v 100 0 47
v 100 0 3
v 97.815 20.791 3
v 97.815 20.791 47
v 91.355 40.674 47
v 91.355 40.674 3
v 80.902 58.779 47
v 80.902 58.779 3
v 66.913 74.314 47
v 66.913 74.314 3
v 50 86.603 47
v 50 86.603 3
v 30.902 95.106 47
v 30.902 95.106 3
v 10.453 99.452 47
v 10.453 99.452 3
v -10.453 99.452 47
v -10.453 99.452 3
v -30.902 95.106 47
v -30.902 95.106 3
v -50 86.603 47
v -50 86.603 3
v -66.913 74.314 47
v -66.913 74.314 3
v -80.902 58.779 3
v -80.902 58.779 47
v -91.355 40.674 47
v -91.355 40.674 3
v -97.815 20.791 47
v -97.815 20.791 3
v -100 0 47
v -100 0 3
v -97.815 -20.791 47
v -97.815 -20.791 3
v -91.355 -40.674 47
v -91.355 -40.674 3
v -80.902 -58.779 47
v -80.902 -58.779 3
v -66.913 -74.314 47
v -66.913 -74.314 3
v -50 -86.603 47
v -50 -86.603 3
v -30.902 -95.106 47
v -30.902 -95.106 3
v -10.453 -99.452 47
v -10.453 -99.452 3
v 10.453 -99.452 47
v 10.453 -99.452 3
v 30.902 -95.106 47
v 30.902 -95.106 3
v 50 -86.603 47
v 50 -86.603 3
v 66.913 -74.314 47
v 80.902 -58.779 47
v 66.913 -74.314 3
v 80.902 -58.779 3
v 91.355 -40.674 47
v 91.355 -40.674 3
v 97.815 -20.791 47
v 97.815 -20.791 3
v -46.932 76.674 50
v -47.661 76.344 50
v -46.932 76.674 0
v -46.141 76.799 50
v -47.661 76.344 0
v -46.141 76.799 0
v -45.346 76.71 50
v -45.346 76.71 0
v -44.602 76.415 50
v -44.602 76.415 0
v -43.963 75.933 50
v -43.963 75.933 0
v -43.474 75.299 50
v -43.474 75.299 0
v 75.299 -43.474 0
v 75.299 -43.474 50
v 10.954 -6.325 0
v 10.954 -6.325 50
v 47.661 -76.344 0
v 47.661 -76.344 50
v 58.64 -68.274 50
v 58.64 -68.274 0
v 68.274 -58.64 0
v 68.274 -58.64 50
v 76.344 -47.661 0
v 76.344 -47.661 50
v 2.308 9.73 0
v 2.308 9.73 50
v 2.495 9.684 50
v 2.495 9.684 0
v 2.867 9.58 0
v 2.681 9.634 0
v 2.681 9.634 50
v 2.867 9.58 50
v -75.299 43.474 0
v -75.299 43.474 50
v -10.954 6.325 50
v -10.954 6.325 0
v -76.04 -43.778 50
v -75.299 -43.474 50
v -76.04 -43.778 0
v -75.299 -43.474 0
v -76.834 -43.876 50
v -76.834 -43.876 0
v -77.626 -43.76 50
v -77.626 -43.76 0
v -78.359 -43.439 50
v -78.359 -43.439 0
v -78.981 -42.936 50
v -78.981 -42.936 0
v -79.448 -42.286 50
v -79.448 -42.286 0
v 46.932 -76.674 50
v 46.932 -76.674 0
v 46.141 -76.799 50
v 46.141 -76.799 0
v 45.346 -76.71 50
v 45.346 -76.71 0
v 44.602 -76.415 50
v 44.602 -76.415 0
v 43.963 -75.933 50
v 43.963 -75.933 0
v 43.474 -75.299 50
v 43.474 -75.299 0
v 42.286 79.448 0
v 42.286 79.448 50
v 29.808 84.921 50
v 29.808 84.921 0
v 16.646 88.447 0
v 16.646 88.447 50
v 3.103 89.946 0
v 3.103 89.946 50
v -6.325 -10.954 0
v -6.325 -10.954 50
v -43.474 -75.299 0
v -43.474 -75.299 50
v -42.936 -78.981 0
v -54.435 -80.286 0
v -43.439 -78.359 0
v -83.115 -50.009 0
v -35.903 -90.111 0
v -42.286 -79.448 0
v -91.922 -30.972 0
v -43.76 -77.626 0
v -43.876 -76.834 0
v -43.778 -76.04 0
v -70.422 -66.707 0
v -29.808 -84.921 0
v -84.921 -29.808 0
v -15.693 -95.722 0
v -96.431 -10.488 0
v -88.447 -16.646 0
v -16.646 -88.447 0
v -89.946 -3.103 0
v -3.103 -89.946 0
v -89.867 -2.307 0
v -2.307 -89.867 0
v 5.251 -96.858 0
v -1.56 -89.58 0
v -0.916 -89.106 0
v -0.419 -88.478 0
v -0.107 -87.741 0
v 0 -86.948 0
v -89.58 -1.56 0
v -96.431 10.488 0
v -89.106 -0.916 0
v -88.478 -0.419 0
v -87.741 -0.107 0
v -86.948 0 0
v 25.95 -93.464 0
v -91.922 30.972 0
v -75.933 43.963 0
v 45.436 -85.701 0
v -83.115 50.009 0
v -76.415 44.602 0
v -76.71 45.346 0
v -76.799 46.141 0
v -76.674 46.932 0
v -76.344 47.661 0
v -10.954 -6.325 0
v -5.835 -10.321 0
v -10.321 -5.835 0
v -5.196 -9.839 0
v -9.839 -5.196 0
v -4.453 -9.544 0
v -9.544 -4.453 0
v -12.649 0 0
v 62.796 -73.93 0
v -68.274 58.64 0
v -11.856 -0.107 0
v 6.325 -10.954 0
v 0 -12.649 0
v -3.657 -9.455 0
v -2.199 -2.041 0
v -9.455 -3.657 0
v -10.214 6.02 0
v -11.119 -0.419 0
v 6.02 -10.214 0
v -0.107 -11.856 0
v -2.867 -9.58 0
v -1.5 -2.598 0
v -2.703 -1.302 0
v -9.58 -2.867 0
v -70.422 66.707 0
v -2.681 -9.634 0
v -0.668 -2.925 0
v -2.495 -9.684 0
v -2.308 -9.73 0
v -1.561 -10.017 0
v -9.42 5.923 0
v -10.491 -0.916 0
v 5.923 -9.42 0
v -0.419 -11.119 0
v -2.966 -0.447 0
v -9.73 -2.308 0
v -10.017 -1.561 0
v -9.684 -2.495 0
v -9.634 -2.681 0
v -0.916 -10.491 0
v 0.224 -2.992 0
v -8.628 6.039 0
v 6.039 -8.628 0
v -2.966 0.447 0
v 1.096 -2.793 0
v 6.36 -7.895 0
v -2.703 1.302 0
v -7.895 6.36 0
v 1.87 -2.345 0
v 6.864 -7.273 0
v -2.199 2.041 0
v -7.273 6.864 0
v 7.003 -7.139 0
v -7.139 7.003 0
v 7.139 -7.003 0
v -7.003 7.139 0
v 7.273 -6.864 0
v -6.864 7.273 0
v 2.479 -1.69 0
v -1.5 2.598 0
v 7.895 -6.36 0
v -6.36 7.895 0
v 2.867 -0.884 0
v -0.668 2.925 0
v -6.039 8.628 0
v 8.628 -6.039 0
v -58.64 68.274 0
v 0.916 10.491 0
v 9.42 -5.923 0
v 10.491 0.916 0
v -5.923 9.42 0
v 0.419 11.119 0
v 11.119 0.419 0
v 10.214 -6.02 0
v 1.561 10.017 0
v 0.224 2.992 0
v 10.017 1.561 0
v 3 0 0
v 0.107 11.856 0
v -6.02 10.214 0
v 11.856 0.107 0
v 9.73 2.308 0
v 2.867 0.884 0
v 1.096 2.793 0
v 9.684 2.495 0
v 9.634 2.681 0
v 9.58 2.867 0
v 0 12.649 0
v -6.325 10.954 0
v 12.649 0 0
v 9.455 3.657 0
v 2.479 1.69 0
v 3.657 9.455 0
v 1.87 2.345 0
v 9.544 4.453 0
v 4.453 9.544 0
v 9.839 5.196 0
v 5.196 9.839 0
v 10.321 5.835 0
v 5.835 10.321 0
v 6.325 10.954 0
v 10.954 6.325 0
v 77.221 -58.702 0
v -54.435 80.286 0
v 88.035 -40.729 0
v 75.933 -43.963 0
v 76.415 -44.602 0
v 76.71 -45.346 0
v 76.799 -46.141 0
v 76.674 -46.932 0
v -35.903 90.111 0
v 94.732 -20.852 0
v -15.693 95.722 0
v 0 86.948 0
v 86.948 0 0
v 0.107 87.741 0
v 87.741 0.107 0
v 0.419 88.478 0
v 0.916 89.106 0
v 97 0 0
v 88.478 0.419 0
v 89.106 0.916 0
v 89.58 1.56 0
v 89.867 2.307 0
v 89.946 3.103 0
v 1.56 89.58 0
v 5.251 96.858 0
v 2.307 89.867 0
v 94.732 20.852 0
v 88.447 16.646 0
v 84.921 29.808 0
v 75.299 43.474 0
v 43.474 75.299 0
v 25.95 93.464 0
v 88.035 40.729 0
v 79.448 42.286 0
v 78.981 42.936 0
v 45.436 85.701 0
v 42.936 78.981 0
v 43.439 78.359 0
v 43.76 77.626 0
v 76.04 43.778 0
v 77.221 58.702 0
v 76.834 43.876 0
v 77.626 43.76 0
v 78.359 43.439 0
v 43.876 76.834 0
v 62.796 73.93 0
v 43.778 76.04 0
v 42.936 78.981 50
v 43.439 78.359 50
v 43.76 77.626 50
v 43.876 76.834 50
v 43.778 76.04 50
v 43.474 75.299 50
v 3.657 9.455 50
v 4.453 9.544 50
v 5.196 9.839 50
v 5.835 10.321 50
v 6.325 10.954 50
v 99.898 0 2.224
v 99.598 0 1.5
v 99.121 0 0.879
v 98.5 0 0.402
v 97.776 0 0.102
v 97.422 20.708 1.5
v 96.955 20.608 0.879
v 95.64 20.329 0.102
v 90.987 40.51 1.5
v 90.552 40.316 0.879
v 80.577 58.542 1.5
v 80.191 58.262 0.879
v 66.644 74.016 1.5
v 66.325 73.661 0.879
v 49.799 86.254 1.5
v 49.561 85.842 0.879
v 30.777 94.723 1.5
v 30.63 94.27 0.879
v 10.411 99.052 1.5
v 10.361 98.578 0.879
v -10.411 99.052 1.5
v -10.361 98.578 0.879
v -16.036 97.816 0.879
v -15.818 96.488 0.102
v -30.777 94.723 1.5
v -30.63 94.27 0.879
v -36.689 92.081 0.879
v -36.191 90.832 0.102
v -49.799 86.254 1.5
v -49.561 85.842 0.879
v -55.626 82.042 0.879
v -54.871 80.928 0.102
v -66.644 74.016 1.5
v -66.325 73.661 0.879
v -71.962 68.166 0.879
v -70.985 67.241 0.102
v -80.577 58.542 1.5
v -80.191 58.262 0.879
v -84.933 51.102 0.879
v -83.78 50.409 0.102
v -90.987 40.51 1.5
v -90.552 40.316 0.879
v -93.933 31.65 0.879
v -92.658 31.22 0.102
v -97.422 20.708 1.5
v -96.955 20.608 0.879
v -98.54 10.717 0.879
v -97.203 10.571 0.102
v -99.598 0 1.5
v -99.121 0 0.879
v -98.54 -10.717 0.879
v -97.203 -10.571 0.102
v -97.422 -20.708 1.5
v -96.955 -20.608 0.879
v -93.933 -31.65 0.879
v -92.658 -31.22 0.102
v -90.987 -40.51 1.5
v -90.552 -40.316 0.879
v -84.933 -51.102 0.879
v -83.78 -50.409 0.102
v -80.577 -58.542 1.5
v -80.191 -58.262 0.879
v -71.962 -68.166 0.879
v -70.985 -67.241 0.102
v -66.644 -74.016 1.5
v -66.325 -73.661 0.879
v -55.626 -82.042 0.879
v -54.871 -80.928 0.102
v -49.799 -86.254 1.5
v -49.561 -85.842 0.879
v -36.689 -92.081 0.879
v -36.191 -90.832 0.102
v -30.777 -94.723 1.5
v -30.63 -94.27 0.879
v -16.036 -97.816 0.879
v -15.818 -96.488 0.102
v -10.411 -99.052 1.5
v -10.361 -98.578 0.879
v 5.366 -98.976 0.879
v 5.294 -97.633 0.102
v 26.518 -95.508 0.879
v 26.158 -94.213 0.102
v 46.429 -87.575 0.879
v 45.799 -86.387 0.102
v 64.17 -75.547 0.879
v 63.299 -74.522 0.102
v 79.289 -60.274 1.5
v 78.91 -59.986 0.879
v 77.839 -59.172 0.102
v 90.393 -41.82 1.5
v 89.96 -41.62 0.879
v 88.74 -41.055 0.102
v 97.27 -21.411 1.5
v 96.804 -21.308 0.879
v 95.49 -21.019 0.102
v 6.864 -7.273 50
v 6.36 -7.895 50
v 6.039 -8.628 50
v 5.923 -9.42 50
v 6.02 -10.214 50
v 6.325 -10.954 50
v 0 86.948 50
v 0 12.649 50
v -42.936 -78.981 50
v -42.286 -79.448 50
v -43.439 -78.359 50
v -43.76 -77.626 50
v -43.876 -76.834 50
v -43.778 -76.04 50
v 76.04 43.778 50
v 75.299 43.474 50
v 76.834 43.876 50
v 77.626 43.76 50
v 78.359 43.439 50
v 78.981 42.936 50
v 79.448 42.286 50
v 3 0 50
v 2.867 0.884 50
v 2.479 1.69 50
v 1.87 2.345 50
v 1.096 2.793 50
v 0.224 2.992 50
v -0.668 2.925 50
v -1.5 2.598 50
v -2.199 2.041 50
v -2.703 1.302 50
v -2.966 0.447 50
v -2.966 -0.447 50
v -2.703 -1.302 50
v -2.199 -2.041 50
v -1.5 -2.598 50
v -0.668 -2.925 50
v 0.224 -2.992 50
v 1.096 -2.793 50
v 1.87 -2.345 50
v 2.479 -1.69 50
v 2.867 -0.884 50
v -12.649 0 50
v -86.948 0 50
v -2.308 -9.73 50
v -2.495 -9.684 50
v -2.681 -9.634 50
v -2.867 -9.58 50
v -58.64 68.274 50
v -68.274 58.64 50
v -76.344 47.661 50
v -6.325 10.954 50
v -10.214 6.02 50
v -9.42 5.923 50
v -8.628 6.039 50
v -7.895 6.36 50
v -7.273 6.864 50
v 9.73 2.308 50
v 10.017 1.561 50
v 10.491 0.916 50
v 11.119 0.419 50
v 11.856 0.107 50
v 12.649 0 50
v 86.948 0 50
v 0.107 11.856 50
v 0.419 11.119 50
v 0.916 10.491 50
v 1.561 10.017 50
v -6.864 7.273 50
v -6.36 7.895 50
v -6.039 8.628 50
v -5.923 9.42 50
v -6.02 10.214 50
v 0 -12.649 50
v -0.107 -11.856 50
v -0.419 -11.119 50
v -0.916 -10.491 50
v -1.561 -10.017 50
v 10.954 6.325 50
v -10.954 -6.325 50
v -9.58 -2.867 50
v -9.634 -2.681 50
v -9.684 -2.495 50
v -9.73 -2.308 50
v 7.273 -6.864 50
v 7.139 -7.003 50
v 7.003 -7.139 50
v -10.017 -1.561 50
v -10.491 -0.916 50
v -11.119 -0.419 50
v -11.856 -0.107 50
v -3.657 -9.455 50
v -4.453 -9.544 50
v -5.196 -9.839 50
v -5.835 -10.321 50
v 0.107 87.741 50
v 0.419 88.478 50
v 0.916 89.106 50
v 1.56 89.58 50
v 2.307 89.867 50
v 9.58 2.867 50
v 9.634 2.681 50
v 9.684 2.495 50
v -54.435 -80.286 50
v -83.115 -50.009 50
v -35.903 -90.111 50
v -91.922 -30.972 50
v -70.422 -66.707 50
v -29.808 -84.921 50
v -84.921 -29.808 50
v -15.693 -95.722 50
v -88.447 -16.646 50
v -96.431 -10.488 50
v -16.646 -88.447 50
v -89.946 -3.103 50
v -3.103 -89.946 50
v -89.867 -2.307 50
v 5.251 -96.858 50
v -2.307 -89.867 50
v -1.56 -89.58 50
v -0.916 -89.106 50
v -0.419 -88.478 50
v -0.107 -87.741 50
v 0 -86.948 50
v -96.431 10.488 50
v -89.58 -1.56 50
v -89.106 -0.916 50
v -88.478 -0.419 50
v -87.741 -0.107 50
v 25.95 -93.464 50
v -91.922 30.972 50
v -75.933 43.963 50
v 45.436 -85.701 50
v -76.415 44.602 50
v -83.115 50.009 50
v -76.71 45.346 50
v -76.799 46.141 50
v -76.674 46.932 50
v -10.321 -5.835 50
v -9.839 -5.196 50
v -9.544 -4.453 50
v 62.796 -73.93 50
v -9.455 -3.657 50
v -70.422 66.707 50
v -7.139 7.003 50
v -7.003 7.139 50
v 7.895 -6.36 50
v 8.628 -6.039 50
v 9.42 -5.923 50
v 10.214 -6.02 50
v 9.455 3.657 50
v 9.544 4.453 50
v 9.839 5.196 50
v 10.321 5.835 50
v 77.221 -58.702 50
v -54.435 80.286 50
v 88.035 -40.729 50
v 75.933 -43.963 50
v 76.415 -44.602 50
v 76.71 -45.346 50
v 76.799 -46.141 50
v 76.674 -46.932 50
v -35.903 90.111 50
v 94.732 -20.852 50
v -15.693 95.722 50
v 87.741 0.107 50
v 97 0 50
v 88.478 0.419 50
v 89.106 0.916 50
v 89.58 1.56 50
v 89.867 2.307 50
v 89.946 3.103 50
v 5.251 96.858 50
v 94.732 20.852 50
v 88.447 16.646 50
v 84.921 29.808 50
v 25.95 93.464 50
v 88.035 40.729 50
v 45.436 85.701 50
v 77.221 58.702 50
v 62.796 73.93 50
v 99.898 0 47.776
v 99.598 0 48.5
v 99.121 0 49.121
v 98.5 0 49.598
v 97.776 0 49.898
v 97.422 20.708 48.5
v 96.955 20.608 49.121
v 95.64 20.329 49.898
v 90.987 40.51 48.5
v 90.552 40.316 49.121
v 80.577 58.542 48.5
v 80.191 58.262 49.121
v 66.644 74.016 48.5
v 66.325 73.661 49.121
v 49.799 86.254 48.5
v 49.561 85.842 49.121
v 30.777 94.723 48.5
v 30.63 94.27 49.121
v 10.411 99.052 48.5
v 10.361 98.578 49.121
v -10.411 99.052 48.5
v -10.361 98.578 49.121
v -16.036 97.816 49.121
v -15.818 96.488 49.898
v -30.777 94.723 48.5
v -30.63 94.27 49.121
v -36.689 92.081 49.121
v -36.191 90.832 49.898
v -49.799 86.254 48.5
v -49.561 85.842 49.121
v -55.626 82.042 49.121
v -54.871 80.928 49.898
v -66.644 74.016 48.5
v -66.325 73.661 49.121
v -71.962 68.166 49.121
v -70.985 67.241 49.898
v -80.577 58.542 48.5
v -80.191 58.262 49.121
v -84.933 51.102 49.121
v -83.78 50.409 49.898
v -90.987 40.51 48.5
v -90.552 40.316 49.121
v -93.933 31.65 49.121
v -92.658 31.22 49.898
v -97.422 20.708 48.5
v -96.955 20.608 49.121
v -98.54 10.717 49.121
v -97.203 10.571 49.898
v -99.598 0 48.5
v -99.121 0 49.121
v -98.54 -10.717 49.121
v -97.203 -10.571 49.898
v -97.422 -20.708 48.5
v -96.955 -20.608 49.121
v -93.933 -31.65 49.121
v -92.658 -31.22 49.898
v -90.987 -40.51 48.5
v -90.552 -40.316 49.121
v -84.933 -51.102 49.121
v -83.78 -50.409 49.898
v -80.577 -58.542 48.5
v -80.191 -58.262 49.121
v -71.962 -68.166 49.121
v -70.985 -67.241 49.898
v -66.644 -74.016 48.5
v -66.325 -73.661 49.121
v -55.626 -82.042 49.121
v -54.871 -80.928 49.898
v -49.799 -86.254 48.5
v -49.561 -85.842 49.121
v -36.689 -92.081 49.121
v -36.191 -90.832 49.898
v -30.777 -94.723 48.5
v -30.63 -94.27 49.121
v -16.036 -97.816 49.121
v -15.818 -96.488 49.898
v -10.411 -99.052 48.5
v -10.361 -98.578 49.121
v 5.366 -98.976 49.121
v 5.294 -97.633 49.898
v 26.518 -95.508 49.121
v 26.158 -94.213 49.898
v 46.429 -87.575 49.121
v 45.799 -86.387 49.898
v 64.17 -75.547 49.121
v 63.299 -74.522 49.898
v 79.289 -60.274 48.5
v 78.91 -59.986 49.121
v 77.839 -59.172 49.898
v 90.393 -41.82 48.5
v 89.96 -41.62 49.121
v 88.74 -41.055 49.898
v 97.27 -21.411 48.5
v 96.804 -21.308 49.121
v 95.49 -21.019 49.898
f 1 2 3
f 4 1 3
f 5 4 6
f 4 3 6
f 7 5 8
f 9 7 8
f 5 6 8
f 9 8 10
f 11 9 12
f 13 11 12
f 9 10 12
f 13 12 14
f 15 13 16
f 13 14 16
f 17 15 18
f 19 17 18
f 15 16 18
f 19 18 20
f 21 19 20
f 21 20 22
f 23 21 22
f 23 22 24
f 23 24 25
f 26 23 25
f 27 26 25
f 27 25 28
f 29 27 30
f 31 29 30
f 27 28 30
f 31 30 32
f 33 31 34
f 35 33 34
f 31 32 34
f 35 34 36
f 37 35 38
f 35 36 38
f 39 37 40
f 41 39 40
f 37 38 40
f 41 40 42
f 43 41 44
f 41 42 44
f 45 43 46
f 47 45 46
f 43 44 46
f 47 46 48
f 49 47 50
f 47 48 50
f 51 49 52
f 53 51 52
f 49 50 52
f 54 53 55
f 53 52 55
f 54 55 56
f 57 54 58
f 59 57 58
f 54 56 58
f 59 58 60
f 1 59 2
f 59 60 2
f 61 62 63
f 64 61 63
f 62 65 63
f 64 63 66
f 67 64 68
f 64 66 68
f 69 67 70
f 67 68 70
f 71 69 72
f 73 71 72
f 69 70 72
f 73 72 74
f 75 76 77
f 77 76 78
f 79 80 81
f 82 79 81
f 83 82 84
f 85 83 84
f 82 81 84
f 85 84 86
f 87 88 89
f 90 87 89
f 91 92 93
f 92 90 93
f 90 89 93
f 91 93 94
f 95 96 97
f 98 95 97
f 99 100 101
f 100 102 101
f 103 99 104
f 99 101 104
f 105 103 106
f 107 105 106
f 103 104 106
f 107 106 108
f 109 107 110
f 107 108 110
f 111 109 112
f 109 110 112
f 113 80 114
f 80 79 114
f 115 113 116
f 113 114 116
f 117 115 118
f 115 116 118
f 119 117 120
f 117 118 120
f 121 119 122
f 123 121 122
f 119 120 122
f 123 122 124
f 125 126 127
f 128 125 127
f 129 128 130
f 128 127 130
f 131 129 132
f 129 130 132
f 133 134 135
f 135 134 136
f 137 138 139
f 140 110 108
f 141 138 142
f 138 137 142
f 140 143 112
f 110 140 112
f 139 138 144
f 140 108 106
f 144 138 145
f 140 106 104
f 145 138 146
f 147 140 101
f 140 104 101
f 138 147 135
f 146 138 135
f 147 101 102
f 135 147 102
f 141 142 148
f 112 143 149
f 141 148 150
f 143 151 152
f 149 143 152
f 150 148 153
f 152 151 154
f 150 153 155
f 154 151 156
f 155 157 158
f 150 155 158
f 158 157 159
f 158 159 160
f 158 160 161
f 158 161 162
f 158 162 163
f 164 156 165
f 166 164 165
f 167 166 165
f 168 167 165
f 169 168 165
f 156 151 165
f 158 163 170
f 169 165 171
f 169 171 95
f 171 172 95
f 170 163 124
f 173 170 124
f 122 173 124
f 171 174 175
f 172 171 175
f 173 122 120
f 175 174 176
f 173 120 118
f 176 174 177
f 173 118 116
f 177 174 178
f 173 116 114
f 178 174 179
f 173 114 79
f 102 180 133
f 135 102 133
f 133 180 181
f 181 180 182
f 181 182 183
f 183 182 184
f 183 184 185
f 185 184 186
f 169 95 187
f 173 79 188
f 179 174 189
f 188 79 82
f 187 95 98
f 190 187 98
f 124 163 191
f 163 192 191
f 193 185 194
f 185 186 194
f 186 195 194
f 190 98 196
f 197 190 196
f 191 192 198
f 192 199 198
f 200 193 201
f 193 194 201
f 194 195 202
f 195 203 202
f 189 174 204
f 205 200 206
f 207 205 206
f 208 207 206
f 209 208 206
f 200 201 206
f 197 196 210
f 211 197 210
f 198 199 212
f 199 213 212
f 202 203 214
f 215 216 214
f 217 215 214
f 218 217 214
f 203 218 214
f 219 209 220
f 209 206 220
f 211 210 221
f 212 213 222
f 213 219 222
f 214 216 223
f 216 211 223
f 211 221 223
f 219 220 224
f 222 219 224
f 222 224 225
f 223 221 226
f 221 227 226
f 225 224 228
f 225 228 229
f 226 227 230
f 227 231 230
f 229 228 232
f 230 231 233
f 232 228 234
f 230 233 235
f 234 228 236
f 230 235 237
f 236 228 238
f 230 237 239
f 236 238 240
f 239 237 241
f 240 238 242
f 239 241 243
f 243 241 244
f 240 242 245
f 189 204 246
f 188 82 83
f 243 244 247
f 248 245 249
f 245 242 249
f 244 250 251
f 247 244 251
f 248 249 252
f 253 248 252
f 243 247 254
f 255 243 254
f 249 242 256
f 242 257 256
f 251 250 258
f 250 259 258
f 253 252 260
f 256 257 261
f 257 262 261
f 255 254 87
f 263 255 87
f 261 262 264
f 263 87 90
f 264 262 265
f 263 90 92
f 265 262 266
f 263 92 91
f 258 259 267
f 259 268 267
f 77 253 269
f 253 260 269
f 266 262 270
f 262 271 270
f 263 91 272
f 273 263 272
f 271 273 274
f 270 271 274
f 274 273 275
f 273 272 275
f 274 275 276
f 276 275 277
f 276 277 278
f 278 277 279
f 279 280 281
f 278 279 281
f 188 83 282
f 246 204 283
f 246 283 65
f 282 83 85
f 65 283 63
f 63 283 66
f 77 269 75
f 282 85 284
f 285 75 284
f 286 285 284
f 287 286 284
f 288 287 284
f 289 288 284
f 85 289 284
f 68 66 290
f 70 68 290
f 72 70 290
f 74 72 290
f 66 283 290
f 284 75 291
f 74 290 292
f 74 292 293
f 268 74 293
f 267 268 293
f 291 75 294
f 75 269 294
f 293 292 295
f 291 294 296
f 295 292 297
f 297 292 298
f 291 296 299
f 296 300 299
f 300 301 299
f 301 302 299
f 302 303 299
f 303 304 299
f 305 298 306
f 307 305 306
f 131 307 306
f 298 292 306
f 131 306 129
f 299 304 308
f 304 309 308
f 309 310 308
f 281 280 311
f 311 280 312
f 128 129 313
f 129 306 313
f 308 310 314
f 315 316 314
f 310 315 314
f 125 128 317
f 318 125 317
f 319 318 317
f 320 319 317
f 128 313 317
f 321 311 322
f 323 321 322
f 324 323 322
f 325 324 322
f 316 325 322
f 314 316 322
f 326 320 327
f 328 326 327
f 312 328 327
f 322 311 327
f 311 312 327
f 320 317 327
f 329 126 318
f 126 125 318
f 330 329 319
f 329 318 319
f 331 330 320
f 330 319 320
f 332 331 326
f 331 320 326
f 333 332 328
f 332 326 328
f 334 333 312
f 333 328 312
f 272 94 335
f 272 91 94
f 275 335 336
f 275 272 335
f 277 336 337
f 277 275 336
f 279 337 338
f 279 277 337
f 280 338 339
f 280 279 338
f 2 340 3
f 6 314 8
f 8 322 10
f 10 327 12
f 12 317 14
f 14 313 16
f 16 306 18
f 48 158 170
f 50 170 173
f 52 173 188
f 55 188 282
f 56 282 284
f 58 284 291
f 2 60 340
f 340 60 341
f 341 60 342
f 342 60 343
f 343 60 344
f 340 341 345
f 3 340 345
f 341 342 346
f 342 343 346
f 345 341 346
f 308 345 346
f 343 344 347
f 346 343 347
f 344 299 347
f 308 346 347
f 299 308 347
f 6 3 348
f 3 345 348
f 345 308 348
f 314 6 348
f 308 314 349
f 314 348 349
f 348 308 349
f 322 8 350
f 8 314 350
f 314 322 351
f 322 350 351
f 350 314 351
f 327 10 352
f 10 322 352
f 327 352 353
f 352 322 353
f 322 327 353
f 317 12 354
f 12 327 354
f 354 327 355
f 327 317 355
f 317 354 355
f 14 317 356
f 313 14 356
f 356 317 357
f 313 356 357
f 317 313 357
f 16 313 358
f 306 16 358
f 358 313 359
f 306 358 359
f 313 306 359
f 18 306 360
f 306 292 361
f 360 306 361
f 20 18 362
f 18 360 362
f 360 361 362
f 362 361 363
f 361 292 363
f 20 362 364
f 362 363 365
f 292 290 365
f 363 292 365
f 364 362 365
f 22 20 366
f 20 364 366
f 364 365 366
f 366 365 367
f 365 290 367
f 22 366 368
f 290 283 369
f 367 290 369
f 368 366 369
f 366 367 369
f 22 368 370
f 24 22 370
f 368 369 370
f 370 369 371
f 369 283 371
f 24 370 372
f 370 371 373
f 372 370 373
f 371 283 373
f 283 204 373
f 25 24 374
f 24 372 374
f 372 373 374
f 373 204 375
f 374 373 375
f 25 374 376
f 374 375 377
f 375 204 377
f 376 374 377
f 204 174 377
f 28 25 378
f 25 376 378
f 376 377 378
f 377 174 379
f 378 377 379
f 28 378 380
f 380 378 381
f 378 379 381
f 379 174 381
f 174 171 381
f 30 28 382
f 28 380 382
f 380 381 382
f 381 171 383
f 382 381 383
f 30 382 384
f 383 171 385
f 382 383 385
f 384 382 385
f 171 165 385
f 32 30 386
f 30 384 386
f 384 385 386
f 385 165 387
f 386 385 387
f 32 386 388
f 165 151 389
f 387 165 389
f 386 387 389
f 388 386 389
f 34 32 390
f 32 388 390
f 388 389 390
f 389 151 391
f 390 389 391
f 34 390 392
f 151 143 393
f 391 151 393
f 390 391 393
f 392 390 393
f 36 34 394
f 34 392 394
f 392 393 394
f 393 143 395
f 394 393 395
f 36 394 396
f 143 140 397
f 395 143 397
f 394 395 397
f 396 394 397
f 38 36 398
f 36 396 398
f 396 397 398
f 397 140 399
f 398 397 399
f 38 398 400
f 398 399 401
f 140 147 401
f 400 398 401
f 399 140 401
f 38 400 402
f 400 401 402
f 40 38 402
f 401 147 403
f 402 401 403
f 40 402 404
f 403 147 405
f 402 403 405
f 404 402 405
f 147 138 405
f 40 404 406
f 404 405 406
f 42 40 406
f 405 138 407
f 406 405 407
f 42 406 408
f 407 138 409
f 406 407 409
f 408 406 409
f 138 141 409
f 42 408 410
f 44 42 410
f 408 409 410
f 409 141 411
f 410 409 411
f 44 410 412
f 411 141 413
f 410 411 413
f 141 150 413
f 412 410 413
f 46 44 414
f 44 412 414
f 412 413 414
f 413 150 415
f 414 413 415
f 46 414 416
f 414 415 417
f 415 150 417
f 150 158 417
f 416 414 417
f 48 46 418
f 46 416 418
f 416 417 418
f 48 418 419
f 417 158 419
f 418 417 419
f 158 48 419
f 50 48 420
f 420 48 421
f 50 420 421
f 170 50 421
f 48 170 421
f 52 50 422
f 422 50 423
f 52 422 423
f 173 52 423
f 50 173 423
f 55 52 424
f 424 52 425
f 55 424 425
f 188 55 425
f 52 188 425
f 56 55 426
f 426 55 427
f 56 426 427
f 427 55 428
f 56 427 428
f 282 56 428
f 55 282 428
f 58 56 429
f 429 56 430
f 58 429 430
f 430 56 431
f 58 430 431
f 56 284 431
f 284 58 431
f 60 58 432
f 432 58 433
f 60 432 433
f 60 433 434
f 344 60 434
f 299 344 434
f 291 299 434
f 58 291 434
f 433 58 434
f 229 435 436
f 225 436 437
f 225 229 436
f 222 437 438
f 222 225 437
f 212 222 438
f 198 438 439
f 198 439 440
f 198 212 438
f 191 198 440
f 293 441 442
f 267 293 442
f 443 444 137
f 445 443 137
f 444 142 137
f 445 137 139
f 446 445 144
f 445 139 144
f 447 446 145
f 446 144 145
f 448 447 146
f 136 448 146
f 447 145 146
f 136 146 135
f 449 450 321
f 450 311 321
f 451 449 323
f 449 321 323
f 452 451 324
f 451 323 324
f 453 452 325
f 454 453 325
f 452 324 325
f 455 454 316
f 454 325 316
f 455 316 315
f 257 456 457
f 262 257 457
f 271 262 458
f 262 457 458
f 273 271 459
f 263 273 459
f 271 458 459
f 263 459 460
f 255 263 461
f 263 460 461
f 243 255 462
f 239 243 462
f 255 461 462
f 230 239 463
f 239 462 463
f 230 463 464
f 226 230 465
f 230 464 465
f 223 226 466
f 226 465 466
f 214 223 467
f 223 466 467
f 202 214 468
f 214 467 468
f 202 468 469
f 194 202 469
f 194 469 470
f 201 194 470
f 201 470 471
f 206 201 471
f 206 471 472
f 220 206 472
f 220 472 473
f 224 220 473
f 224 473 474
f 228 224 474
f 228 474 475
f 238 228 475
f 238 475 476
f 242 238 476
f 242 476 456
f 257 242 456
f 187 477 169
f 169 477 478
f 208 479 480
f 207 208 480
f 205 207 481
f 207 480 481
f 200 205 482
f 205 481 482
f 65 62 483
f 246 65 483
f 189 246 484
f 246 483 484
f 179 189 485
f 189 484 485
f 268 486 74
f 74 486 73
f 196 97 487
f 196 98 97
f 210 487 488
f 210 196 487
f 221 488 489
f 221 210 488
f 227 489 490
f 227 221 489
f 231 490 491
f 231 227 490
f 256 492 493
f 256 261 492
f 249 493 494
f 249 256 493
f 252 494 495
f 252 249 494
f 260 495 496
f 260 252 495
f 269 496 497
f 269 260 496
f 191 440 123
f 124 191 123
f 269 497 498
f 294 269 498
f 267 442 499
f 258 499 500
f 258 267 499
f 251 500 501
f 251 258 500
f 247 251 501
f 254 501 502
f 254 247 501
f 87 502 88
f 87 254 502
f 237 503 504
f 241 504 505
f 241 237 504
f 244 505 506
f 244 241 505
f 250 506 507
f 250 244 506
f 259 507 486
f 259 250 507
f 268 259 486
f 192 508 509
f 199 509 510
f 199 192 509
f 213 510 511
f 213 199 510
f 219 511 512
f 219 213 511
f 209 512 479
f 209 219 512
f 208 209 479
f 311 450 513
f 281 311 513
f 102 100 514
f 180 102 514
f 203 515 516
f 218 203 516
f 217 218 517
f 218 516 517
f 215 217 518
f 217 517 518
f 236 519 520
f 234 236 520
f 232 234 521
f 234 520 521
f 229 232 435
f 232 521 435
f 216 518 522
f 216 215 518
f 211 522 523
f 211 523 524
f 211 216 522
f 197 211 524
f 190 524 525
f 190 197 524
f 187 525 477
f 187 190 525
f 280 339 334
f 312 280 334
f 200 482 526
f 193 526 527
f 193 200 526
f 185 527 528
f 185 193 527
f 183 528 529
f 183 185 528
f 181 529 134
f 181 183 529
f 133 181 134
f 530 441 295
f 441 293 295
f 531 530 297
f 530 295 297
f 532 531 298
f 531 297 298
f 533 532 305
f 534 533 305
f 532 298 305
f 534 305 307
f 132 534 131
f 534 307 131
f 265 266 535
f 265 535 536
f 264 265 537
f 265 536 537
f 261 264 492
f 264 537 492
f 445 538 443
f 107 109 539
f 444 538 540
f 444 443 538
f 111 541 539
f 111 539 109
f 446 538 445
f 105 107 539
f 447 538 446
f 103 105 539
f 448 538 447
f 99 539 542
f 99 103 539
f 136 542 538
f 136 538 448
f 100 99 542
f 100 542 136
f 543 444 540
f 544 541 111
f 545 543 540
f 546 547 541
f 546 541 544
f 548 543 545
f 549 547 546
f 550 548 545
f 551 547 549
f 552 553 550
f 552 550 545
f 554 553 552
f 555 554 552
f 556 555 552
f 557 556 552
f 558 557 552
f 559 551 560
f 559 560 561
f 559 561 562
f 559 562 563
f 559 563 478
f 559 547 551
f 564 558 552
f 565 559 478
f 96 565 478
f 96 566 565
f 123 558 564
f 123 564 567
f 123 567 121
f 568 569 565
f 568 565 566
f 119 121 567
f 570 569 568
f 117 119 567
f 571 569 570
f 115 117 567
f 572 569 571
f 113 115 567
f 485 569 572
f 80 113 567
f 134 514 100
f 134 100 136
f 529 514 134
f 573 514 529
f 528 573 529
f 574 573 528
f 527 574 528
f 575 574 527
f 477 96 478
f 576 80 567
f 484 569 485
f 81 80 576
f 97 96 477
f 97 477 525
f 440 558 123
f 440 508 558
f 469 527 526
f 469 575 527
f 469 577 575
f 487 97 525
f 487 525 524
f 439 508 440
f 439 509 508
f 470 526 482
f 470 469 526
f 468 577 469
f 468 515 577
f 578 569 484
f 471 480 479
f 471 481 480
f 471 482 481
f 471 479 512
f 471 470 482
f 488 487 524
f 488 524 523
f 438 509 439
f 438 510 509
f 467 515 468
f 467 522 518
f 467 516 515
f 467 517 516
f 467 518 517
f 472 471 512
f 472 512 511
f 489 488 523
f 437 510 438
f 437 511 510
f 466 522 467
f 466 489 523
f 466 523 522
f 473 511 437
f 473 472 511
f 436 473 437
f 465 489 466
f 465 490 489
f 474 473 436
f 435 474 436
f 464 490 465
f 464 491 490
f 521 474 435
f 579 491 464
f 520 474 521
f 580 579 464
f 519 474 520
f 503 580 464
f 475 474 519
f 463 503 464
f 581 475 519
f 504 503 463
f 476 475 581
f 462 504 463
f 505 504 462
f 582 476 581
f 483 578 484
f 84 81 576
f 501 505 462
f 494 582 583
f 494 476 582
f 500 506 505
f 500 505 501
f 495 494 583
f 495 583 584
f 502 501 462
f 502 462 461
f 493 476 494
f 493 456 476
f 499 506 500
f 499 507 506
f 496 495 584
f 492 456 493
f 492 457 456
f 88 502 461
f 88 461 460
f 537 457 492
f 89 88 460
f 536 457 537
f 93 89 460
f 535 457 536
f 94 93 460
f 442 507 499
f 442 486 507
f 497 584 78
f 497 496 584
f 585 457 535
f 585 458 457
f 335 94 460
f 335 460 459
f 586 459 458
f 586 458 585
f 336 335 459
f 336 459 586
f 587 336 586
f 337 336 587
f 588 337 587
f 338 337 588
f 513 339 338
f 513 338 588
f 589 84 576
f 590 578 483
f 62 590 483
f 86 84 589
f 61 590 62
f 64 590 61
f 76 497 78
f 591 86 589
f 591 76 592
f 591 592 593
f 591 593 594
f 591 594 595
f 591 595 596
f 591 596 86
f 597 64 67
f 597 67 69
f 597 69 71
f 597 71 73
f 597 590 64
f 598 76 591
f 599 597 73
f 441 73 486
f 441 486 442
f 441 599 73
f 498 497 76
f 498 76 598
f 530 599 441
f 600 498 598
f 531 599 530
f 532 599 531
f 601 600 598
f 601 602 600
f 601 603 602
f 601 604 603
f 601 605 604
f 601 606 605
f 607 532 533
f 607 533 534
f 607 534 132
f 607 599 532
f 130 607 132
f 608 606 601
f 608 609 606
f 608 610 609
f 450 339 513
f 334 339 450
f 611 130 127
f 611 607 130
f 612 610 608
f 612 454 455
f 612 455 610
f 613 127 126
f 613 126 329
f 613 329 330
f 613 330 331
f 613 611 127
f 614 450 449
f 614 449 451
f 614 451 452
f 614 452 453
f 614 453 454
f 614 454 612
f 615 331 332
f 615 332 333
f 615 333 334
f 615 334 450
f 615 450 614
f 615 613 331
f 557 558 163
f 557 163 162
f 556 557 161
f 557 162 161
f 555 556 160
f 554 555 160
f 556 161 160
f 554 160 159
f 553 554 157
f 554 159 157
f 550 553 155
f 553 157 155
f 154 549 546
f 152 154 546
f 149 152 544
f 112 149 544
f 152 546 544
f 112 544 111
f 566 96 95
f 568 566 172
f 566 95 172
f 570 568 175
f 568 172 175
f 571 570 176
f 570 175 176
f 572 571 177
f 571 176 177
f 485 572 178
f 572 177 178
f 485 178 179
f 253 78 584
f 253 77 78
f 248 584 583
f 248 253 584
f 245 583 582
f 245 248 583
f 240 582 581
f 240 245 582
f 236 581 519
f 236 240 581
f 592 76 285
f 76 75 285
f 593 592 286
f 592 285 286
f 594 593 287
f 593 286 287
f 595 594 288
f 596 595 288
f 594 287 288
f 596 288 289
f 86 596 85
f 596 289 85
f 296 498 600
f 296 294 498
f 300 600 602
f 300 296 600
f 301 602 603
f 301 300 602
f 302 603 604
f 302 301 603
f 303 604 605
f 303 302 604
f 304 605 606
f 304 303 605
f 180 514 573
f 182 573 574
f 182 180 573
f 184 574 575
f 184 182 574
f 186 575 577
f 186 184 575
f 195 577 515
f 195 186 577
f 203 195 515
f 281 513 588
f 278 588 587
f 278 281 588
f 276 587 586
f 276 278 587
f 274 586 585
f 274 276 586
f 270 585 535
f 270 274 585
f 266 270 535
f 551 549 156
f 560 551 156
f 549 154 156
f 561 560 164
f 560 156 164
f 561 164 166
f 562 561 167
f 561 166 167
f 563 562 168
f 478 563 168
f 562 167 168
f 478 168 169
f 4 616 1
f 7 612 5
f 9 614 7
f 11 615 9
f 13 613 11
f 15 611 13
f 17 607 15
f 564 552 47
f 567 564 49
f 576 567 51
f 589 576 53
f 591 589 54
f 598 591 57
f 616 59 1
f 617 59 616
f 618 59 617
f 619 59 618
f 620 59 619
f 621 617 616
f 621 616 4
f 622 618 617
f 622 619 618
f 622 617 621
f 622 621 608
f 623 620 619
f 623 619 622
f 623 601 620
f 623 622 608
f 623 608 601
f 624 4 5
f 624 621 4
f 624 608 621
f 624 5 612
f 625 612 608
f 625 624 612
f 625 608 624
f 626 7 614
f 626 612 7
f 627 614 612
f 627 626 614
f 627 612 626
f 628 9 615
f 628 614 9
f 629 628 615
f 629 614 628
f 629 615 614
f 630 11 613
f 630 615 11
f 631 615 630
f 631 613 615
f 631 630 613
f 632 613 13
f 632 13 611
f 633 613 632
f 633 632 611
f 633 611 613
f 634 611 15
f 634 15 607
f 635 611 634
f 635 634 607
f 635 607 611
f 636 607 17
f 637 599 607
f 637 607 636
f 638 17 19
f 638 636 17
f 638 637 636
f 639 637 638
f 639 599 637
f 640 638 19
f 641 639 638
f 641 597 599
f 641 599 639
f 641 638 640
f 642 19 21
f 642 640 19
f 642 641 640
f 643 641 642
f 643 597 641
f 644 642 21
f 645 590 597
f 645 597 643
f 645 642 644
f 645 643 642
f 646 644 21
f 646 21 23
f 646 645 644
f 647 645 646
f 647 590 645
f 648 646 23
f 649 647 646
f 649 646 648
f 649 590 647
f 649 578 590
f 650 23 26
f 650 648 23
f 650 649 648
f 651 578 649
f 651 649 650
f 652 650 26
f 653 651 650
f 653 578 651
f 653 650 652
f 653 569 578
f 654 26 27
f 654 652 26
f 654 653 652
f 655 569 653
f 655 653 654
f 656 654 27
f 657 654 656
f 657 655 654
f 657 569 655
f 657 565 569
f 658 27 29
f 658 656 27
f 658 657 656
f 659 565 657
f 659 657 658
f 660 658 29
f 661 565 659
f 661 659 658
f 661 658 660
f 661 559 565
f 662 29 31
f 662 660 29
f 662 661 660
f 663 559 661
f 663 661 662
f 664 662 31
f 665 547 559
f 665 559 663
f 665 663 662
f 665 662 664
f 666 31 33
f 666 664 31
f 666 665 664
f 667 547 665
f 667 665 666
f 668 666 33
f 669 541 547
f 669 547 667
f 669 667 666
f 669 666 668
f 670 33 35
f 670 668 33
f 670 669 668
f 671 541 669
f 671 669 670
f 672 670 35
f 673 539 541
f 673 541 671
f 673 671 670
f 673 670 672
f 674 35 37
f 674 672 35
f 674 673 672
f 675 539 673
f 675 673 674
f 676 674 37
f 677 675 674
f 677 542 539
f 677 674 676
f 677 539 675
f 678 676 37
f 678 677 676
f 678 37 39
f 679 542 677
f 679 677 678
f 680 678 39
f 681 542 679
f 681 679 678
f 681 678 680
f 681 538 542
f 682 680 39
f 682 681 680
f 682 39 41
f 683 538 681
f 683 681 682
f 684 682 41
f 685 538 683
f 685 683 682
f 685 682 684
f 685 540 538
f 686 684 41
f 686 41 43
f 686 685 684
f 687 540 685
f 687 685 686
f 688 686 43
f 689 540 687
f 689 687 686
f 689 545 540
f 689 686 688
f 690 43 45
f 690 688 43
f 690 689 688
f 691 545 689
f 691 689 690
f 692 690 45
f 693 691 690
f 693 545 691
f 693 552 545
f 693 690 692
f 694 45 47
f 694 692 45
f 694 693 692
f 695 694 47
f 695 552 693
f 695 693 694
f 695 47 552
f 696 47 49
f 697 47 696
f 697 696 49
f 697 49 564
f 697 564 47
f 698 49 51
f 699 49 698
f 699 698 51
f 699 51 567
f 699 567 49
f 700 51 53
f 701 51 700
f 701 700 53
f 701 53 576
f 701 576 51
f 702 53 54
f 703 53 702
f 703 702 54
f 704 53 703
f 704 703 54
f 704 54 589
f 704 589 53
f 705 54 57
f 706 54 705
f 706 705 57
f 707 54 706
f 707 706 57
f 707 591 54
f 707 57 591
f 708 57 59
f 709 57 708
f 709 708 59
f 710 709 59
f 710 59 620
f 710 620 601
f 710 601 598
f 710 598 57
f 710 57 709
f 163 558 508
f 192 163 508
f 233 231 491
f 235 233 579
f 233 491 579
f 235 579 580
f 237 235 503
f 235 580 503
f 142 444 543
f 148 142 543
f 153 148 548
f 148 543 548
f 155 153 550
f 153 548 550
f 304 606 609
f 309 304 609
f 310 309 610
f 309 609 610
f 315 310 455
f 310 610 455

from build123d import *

# Parameters (mm, degrees)
SKETCH1_R           = 100
BOSS_EXTRUDE1_DEPTH = 50
CUT_EXTRUDE1_DEPTH  = 151
CIRPATTERN1_COUNT   = 6
FILLET1_R           = 3
SKETCH3_R           = 3
CUT_EXTRUDE2_DEPTH  = 151.000000067


with BuildPart() as part:
    # Sketch1 → Boss-Extrude1 (new body)
    with BuildSketch(Plane.XY):
        Circle(SKETCH1_R)
    extrude(amount=BOSS_EXTRUDE1_DEPTH)

    # Sketch2 → Cut-Extrude1 (cut, through all)
    with BuildSketch(Plane.XY.offset(50)):
        with BuildLine():
            Line((0, 90), (0, 10))
            ThreePointArc((0, 10), (2.588190451, 9.659258263), (5, 8.660254038))
            Line((5, 8.660254038), (45, 77.942286341))
            ThreePointArc((45, 77.942286341), (23.293714059, 86.933324366), (0, 90))
        make_face()
    cut_extrude1 = extrude(amount=-CUT_EXTRUDE1_DEPTH, mode=Mode.SUBTRACT)

    # CirPattern1: Cut-Extrude1 ×6 about axis
    cirpattern1_axis = Axis((0, 0, 0), (0, 0, 1))
    for i in range(1, CIRPATTERN1_COUNT):
        add(cut_extrude1.rotate(cirpattern1_axis, i * 360 / CIRPATTERN1_COUNT), mode=Mode.SUBTRACT)

    # Fillet1
    fillet1_edges = [part.edges().sort_by_distance(p)[0] for p in [
        (45, 77.942286341, 25),
        (5, 8.660254038, 25),
        (0, 10, 25),
        (0, 90, 25),
        (-100, 0, 0),
        (90, 0, 25),
        (10, 0, 25),
        (8.660254038, 5, 25),
        (77.942286341, 45, 25),
        (45, -77.942286341, 25),
        (5, -8.660254038, 25),
        (8.660254038, -5, 25),
        (-100, 0, 50),
        (77.942286341, -45, 25),
        (-90, 0, 25),
        (-10, 0, 25),
        (-8.660254038, -5, 25),
        (-77.942286341, -45, 25),
        (-45, -77.942286341, 25),
        (-5, -8.660254038, 25),
        (0, -10, 25),
        (0, -90, 25),
        (-45, 77.942286341, 25),
        (-5, 8.660254038, 25),
        (-8.660254038, 5, 25),
        (-77.942286341, 45, 25),
    ]]
    fillet(fillet1_edges, radius=FILLET1_R)

    # Sketch3 → Cut-Extrude2 (cut, through all)
    with BuildSketch(Plane.XY.offset(50)):
        Circle(SKETCH3_R)
    extrude(amount=-CUT_EXTRUDE2_DEPTH, mode=Mode.SUBTRACT)


solid = part.part
